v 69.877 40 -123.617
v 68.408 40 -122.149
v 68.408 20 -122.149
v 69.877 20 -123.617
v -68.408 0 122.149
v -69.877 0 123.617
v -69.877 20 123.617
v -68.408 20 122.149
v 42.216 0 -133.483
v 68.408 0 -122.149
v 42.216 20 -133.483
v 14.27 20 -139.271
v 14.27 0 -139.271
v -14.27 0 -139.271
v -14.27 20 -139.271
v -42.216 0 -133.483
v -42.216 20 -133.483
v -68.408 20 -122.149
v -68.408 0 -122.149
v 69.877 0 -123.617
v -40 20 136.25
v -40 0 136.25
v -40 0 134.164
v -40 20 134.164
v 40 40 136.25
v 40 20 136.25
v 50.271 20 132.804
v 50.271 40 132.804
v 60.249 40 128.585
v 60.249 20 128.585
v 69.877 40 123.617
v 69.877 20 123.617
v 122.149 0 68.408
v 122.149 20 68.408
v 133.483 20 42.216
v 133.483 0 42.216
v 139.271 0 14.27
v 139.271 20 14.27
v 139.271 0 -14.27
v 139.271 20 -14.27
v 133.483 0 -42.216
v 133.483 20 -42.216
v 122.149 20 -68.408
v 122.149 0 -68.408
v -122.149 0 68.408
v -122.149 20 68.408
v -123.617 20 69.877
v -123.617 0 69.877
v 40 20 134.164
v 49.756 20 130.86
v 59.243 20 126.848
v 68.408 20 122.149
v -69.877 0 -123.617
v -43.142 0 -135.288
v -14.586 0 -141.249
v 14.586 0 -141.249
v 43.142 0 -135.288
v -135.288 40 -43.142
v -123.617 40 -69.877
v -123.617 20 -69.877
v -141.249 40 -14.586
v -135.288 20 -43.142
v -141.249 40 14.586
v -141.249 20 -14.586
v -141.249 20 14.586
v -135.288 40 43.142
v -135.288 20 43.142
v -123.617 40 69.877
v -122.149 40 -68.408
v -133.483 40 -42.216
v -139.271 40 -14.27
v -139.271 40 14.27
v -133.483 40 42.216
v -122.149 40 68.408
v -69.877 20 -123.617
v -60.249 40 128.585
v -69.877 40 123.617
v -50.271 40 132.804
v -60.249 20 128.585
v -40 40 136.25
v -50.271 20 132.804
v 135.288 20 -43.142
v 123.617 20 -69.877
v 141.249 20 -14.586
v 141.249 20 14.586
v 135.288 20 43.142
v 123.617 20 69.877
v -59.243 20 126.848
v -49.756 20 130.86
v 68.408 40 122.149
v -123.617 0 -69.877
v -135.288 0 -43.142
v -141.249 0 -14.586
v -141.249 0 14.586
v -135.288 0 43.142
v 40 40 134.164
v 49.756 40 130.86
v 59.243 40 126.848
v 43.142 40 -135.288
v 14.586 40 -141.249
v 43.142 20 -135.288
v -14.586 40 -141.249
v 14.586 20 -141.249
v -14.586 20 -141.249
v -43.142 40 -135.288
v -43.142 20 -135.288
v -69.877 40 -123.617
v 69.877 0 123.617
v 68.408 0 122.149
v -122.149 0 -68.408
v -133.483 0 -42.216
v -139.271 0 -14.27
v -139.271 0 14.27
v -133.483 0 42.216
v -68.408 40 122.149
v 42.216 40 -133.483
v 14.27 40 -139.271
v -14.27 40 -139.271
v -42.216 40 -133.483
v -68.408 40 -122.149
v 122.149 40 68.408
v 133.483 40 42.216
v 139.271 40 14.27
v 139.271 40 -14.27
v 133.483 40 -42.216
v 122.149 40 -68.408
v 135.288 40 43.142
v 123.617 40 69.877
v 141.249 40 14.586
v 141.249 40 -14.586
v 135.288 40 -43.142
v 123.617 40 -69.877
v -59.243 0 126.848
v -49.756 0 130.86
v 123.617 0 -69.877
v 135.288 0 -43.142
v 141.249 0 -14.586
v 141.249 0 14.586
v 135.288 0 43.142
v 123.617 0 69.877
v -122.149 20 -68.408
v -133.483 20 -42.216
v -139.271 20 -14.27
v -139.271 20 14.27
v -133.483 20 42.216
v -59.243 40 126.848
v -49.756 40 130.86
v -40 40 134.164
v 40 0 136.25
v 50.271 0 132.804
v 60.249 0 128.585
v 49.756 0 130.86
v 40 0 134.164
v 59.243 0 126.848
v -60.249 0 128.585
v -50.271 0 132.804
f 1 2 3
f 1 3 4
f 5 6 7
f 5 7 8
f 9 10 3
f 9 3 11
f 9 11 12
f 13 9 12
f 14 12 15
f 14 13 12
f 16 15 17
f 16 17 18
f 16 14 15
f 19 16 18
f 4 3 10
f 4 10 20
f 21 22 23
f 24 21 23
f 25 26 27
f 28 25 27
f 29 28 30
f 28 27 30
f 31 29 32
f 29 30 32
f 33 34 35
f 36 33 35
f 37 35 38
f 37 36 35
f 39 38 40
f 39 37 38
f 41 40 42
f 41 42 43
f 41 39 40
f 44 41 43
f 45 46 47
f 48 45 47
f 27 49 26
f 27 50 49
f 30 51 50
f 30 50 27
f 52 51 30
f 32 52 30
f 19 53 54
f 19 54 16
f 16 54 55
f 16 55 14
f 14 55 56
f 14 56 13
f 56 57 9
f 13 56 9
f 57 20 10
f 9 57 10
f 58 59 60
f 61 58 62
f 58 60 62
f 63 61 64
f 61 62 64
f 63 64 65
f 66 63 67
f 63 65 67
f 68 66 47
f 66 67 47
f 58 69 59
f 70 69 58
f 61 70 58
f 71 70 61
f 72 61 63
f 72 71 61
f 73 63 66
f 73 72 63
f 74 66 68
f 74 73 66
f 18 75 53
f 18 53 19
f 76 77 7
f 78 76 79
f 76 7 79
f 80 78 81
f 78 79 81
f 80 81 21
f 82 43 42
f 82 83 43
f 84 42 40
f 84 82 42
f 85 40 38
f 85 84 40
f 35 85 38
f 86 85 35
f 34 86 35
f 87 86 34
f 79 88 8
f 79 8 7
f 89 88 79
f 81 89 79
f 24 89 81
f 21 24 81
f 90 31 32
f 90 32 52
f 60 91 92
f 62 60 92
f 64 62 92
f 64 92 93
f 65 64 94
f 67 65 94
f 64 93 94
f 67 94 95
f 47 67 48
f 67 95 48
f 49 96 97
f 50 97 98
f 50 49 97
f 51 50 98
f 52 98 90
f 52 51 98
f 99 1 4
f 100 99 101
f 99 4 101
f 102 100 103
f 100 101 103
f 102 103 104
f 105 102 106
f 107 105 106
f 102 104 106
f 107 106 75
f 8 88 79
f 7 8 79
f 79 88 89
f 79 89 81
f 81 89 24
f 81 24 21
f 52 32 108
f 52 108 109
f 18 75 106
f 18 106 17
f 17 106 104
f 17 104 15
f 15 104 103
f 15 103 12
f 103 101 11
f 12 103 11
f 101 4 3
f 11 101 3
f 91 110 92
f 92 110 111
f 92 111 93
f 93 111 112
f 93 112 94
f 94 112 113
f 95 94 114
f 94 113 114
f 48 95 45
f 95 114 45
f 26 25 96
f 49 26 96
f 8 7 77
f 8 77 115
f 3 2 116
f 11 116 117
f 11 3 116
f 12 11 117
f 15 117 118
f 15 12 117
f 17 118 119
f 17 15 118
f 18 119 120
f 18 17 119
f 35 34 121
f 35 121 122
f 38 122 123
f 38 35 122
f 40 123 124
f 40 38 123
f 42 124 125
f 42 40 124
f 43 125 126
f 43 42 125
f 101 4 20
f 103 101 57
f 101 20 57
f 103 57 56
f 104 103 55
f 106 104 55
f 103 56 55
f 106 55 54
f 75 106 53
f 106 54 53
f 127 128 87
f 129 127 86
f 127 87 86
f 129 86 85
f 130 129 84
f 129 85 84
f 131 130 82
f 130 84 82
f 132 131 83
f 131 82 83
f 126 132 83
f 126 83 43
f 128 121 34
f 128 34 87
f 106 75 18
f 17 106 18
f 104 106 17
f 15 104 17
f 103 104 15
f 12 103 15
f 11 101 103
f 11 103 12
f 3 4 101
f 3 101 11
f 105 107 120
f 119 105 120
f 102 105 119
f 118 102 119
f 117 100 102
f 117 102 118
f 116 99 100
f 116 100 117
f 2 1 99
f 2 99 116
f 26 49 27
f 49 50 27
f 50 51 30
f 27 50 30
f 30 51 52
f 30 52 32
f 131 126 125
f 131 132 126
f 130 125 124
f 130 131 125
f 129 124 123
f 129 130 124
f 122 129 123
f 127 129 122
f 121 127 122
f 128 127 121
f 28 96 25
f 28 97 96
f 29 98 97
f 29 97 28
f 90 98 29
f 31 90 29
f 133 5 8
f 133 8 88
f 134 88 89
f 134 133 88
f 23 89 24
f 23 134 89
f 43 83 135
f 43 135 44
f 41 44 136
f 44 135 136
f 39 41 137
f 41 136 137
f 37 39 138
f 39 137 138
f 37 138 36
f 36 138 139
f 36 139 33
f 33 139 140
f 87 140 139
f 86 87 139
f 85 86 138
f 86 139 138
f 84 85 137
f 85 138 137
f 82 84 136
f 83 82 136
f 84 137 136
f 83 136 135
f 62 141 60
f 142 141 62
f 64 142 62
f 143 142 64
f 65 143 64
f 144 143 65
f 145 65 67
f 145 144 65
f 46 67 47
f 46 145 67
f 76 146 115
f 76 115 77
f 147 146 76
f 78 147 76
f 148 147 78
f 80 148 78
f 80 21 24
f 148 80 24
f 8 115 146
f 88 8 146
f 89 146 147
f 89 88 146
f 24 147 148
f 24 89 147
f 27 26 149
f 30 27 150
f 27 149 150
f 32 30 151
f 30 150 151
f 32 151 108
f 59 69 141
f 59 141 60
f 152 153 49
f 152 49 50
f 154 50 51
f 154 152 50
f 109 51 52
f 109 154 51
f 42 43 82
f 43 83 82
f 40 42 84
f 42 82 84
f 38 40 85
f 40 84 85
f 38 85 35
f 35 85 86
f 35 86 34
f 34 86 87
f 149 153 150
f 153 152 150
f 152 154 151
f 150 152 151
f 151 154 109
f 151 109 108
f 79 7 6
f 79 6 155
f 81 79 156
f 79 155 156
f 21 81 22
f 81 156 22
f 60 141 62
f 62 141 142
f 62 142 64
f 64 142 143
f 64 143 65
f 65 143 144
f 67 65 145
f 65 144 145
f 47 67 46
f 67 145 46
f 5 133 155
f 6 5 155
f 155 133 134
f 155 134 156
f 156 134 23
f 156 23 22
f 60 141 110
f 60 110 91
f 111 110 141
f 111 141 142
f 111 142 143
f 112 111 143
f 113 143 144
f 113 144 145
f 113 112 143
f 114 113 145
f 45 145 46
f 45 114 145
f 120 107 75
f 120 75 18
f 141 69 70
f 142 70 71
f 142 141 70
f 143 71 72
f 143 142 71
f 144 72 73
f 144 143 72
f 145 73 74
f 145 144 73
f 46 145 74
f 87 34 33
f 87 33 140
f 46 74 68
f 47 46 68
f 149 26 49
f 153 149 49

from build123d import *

# Parameters (mm, degrees)
SKETCH1_R           = 142
SKETCH1_R_2         = 140
BOSS_EXTRUDE1_DEPTH = 20
SKETCH2_R           = 142
SKETCH2_R_2         = 140
BOSS_EXTRUDE2_DEPTH = 20
SKETCH3_W           = 80
SKETCH3_H           = 7.83592135
CUT_EXTRUDE1_DEPTH  = 205.763277958
CUT_EXTRUDE2_DEPTH  = 205.763277958


with BuildPart() as part:
    # Sketch1 → Boss-Extrude1 (new body)
    with BuildSketch(Plane(origin=(0, 0, 0), x_dir=(1, 0, 0), z_dir=(0, 1, 0))):
        with Locations(Location((0, 0, 0), (0, 0, 270))):
            Circle(SKETCH1_R)
        with Locations(Location((0, 0, 0), (0, 0, 270))):
            Circle(SKETCH1_R_2, mode=Mode.SUBTRACT)
    extrude(amount=BOSS_EXTRUDE1_DEPTH)


with BuildPart() as body_2:
    # Sketch2 → Boss-Extrude2 (new body)
    with BuildSketch(Plane(origin=(0, 20, 0), x_dir=(1, 0, 0), z_dir=(0, 1, 0))):
        with Locations(Location((0, 0, 0), (0, 0, 270))):
            Circle(SKETCH2_R)
        with Locations(Location((0, 0, 0), (0, 0, 270))):
            Circle(SKETCH2_R_2, mode=Mode.SUBTRACT)
    extrude(amount=BOSS_EXTRUDE2_DEPTH)


with BuildPart() as cut_extrude1_tool:
    # Sketch3 → Cut-Extrude1 (new, through all)
    with BuildSketch(Plane(origin=(0, 40, 0), x_dir=(1, 0, 0), z_dir=(0, 1, 0))):
        with Locations((0, -138.082039325)):
            Rectangle(SKETCH3_W, SKETCH3_H)
    extrude(amount=-CUT_EXTRUDE1_DEPTH)


with BuildPart() as part_1:
    add(part.part)

    # Cut-Extrude1: cut by cut_extrude1_tool
    add(cut_extrude1_tool.part, mode=Mode.SUBTRACT)


with BuildPart() as body_2_1:
    add(body_2.part)

    # Cut-Extrude1: cut by cut_extrude1_tool
    add(cut_extrude1_tool.part, mode=Mode.SUBTRACT)


with BuildPart() as cut_extrude2_tool:
    # Sketch4 → Cut-Extrude2 (new, through all)
    with BuildSketch(Plane(origin=(0, 40, 0), x_dir=(1, 0, 0), z_dir=(0, 1, 0))):
        Polygon((-127.279220614, 73.539105243), (-73.539105243, 127.279220614), (-68.408481347, 122.148596717), (-122.148596717, 68.408481347), align=None)
        Polygon((68.408481347, -122.148596717), (122.148596717, -68.408481347), (127.279220614, -73.539105243), (73.539105243, -127.279220614), align=None)
        Polygon((73.539105243, 127.279220614), (127.279220614, 73.539105243), (122.148596717, 68.408481347), (68.408481347, 122.148596717), align=None)
        Polygon((-127.279220614, -73.539105243), (-73.539105243, -127.279220614), (-68.408481347, -122.148596717), (-122.148596717, -68.408481347), align=None)
    extrude(amount=-CUT_EXTRUDE2_DEPTH)


with BuildPart() as part_2:
    add(part_1.part)

    # Cut-Extrude2: cut by cut_extrude2_tool
    add(cut_extrude2_tool.part, mode=Mode.SUBTRACT)


with BuildPart() as body_2_2:
    add(body_2_1.part)

    # Cut-Extrude2: cut by cut_extrude2_tool
    add(cut_extrude2_tool.part, mode=Mode.SUBTRACT)


with BuildPart() as cut_extrude2_piece_1:
    # of the separate pieces the step leaves, piece 1, a body of its own (cut_extrude2_pieces)
    add(part_2.part.solids().sort_by_distance((122.148596717, 0, 68.408481347))[0])


with BuildPart() as cut_extrude2_piece_2:
    # of the separate pieces the step leaves, piece 2, a body of its own (cut_extrude2_pieces)
    add(part_2.part.solids().sort_by_distance((-122.148596717, 0, -68.408481347))[0])


with BuildPart() as cut_extrude2_piece_3:
    # of the separate pieces the step leaves, piece 3, a body of its own (cut_extrude2_pieces)
    add(part_2.part.solids().sort_by_distance((68.408481347, 0, -122.148596717))[0])


with BuildPart() as cut_extrude2_piece_4:
    # of the separate pieces the step leaves, piece 4, a body of its own (cut_extrude2_pieces)
    add(part_2.part.solids().sort_by_distance((40, 0, 136.249770642))[0])


with BuildPart() as cut_extrude2_piece_5:
    # of the separate pieces the step leaves, piece 5, a body of its own (cut_extrude2_pieces)
    add(part_2.part.solids().sort_by_distance((-68.408481347, 0, 122.148596717))[0])


with BuildPart() as cut_extrude2_piece_1_of_body_2:
    # of the separate pieces the step leaves, piece 1, a body of its own (cut_extrude2_pieces_of_body_2)
    add(body_2_2.part.solids().sort_by_distance((122.148596717, 20, 68.408481347))[0])


with BuildPart() as cut_extrude2_piece_2_of_body_2:
    # of the separate pieces the step leaves, piece 2, a body of its own (cut_extrude2_pieces_of_body_2)
    add(body_2_2.part.solids().sort_by_distance((-122.148596717, 20, -68.408481347))[0])


with BuildPart() as cut_extrude2_piece_3_of_body_2:
    # of the separate pieces the step leaves, piece 3, a body of its own (cut_extrude2_pieces_of_body_2)
    add(body_2_2.part.solids().sort_by_distance((68.408481347, 20, -122.148596717))[0])


with BuildPart() as cut_extrude2_piece_4_of_body_2:
    # of the separate pieces the step leaves, piece 4, a body of its own (cut_extrude2_pieces_of_body_2)
    add(body_2_2.part.solids().sort_by_distance((40, 20, 136.249770642))[0])


with BuildPart() as cut_extrude2_piece_5_of_body_2:
    # of the separate pieces the step leaves, piece 5, a body of its own (cut_extrude2_pieces_of_body_2)
    add(body_2_2.part.solids().sort_by_distance((-68.408481347, 20, 122.148596717))[0])


solid = Compound([cut_extrude2_piece_1.part, cut_extrude2_piece_2.part, cut_extrude2_piece_3.part, cut_extrude2_piece_4.part, cut_extrude2_piece_5.part, cut_extrude2_piece_1_of_body_2.part, cut_extrude2_piece_2_of_body_2.part, cut_extrude2_piece_3_of_body_2.part, cut_extrude2_piece_4_of_body_2.part, cut_extrude2_piece_5_of_body_2.part])
